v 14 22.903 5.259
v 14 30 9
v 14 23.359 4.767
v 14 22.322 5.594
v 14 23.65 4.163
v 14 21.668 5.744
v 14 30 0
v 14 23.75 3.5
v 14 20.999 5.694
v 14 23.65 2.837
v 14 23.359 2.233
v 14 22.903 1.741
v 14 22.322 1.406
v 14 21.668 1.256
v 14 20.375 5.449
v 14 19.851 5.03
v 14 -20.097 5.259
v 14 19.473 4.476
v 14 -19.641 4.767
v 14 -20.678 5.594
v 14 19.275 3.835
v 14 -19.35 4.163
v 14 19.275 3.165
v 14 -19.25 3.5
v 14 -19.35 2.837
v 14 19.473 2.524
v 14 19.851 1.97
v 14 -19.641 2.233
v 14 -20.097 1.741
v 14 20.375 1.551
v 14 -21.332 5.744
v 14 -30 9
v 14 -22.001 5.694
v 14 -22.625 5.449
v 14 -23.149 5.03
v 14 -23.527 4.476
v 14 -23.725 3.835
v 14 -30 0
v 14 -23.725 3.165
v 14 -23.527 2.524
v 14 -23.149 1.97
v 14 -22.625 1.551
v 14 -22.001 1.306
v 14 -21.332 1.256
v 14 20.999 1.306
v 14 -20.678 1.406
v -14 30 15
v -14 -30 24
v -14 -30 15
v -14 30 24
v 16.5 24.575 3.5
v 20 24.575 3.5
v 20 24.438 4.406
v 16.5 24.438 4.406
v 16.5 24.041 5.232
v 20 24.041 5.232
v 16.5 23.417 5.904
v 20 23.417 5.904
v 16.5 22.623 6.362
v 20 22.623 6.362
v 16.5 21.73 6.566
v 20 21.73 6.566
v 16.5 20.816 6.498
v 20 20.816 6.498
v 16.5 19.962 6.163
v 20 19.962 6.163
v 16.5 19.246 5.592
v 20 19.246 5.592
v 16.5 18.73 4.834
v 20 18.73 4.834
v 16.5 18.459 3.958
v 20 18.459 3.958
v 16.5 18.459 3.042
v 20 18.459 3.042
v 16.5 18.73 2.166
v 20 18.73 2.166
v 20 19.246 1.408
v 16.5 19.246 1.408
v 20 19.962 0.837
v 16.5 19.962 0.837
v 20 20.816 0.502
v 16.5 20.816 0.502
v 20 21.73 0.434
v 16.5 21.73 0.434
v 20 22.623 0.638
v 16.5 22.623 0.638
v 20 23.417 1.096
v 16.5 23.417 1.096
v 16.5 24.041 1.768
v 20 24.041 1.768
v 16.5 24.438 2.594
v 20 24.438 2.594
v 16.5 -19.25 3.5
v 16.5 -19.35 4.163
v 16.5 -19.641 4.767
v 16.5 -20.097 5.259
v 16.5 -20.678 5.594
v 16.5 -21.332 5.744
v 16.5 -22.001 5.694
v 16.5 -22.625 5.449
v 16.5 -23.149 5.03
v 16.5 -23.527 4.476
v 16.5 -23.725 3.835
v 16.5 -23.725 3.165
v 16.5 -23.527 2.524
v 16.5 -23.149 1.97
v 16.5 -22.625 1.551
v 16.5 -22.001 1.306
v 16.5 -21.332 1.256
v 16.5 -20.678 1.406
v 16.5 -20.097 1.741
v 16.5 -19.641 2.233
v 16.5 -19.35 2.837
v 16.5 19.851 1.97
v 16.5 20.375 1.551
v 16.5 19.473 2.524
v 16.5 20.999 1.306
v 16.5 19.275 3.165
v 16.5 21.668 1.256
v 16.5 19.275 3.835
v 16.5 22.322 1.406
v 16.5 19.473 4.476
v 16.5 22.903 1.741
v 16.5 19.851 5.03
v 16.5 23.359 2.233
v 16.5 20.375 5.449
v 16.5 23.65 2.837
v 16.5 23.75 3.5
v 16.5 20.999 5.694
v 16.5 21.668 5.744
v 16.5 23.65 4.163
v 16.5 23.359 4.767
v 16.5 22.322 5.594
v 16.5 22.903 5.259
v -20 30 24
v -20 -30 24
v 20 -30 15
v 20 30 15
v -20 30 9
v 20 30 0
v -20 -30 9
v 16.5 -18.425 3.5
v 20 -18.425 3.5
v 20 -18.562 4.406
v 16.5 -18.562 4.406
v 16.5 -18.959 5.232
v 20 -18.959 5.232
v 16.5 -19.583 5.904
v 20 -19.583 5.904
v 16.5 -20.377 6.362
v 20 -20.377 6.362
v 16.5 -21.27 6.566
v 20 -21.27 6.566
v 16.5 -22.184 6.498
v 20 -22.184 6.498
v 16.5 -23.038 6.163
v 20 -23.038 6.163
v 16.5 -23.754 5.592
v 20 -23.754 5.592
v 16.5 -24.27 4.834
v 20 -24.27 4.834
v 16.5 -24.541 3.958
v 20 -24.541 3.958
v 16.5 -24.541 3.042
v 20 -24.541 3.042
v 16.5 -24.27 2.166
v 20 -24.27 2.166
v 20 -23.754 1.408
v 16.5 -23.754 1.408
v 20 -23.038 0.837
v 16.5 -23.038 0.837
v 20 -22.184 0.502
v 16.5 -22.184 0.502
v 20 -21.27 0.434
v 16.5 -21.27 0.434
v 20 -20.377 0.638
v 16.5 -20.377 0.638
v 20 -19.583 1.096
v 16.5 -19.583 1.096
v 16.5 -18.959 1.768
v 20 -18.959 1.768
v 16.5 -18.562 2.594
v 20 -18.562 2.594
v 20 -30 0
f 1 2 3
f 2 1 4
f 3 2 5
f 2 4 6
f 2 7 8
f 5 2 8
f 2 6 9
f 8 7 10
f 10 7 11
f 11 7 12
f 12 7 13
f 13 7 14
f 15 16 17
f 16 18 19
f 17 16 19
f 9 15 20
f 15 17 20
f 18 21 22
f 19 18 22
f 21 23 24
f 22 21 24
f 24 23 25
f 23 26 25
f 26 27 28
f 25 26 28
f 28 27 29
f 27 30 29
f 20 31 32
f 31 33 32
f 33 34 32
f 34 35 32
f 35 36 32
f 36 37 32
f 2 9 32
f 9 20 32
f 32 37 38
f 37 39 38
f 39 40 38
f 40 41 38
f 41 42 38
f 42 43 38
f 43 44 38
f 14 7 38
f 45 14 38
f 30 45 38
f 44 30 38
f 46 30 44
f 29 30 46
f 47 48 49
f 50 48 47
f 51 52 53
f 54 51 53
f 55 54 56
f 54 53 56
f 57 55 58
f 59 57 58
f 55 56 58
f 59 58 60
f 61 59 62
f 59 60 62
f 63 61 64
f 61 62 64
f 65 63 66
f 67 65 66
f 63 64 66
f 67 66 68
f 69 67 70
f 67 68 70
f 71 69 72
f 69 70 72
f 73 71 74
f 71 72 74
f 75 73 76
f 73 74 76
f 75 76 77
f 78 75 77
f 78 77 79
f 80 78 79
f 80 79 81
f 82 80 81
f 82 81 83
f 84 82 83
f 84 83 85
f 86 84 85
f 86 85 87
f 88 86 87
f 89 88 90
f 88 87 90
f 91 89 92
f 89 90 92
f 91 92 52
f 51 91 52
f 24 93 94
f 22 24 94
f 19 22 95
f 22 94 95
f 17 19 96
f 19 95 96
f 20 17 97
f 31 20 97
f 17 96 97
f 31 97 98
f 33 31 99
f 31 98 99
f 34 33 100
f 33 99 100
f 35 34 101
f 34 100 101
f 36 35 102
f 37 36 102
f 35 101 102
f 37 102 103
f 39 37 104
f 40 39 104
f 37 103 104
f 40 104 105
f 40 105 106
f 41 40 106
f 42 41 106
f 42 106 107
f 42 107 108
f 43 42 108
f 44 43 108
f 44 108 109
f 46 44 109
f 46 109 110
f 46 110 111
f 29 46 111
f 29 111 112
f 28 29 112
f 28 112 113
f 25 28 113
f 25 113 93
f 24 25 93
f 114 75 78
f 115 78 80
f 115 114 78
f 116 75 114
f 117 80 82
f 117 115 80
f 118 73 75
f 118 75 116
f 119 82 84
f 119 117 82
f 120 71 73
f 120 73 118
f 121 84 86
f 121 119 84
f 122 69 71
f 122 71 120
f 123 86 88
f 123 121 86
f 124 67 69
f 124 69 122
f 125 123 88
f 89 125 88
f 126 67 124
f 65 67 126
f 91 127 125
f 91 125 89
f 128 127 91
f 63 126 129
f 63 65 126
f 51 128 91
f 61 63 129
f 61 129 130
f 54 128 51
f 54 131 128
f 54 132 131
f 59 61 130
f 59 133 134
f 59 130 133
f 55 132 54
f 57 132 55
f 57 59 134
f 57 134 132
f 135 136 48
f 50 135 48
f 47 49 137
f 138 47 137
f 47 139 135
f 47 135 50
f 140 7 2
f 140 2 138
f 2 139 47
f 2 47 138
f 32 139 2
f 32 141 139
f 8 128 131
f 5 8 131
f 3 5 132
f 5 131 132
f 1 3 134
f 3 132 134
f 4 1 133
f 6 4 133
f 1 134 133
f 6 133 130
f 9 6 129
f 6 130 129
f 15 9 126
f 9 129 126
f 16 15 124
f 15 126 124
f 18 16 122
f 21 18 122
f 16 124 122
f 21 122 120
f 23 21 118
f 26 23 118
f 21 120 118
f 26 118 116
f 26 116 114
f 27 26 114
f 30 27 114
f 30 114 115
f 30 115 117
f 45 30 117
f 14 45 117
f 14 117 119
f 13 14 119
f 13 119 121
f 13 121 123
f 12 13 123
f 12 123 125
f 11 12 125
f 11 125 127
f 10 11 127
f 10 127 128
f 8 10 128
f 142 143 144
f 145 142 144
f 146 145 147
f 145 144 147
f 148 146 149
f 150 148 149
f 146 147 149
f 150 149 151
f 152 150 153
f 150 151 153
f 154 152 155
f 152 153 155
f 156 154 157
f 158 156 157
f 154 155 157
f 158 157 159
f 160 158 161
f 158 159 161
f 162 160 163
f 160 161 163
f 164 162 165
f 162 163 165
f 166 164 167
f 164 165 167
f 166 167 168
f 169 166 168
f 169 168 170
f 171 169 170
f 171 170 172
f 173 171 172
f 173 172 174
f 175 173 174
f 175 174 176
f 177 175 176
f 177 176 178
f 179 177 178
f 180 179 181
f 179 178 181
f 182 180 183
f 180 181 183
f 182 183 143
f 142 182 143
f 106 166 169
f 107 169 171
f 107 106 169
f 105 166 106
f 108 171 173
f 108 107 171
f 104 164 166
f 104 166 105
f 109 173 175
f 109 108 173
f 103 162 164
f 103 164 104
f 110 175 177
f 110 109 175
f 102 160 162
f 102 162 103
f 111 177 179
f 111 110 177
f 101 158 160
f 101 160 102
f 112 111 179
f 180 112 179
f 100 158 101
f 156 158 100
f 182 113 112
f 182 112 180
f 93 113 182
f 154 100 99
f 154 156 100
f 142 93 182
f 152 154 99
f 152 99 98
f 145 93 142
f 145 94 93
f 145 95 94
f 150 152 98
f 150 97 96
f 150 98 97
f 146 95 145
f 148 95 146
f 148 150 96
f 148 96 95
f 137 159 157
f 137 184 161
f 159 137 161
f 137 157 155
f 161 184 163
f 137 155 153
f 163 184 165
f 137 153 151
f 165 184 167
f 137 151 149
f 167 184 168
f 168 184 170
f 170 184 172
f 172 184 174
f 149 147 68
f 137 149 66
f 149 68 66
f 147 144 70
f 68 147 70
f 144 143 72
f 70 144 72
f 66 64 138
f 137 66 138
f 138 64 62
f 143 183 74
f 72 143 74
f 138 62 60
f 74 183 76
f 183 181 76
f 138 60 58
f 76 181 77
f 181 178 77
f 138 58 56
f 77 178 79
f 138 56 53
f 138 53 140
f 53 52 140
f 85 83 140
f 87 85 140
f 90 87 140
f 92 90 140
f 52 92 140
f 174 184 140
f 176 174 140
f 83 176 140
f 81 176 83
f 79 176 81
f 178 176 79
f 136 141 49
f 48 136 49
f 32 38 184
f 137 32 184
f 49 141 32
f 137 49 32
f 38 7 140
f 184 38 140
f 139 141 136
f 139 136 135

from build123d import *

# Parameters (mm, degrees)
F0_W     = 40
F0_H     = 60
F1_DEPTH = 24
F2_W     = 65.936946
F2_H     = 73.230896
F3_DEPTH = 9
F4_W     = 66.143565
F4_H     = 69.968968
F5_DEPTH = 9
F6_R     = 2.25
F7_DEPTH = 8
F8_R     = 3.075
F9_DEPTH = 3.5


with BuildPart() as f1:
    # F0 (on Top) → F1 (new body)
    with BuildSketch(Plane.XY):
        Rectangle(F0_W, F0_H)
    extrude(amount=F1_DEPTH)

    # F2 (on face) → F3 (cut)
    with BuildSketch(Plane.XY.offset(24)):
        with Locations((18.968473, 0)):
            Rectangle(F2_W, F2_H)
    extrude(amount=-F3_DEPTH, mode=Mode.SUBTRACT)

    # F4 (on face) → F5 (cut)
    with BuildSketch(Plane(origin=(0, 0, 0), x_dir=(1, 0, 0), z_dir=(0, 0, -1))):
        with Locations((-19.071782, 0)):
            Rectangle(F4_W, F4_H)
    extrude(amount=-F5_DEPTH, mode=Mode.SUBTRACT)

    # F6 (on face) → F7 (cut)
    with BuildSketch(Plane.YZ.offset(20)):
        with Locations((21.5, 3.5)):
            Circle(F6_R)
        with Locations((-21.5, 3.5)):
            Circle(F6_R)
    extrude(amount=-F7_DEPTH, mode=Mode.SUBTRACT)

    # F8 (on face) → F9 (cut)
    with BuildSketch(Plane.YZ.offset(20)):
        with Locations((-21.5, 3.5)):
            Circle(F8_R)
        with Locations((21.5, 3.5)):
            Circle(F8_R)
    extrude(amount=-F9_DEPTH, mode=Mode.SUBTRACT)


solid = f1.part
